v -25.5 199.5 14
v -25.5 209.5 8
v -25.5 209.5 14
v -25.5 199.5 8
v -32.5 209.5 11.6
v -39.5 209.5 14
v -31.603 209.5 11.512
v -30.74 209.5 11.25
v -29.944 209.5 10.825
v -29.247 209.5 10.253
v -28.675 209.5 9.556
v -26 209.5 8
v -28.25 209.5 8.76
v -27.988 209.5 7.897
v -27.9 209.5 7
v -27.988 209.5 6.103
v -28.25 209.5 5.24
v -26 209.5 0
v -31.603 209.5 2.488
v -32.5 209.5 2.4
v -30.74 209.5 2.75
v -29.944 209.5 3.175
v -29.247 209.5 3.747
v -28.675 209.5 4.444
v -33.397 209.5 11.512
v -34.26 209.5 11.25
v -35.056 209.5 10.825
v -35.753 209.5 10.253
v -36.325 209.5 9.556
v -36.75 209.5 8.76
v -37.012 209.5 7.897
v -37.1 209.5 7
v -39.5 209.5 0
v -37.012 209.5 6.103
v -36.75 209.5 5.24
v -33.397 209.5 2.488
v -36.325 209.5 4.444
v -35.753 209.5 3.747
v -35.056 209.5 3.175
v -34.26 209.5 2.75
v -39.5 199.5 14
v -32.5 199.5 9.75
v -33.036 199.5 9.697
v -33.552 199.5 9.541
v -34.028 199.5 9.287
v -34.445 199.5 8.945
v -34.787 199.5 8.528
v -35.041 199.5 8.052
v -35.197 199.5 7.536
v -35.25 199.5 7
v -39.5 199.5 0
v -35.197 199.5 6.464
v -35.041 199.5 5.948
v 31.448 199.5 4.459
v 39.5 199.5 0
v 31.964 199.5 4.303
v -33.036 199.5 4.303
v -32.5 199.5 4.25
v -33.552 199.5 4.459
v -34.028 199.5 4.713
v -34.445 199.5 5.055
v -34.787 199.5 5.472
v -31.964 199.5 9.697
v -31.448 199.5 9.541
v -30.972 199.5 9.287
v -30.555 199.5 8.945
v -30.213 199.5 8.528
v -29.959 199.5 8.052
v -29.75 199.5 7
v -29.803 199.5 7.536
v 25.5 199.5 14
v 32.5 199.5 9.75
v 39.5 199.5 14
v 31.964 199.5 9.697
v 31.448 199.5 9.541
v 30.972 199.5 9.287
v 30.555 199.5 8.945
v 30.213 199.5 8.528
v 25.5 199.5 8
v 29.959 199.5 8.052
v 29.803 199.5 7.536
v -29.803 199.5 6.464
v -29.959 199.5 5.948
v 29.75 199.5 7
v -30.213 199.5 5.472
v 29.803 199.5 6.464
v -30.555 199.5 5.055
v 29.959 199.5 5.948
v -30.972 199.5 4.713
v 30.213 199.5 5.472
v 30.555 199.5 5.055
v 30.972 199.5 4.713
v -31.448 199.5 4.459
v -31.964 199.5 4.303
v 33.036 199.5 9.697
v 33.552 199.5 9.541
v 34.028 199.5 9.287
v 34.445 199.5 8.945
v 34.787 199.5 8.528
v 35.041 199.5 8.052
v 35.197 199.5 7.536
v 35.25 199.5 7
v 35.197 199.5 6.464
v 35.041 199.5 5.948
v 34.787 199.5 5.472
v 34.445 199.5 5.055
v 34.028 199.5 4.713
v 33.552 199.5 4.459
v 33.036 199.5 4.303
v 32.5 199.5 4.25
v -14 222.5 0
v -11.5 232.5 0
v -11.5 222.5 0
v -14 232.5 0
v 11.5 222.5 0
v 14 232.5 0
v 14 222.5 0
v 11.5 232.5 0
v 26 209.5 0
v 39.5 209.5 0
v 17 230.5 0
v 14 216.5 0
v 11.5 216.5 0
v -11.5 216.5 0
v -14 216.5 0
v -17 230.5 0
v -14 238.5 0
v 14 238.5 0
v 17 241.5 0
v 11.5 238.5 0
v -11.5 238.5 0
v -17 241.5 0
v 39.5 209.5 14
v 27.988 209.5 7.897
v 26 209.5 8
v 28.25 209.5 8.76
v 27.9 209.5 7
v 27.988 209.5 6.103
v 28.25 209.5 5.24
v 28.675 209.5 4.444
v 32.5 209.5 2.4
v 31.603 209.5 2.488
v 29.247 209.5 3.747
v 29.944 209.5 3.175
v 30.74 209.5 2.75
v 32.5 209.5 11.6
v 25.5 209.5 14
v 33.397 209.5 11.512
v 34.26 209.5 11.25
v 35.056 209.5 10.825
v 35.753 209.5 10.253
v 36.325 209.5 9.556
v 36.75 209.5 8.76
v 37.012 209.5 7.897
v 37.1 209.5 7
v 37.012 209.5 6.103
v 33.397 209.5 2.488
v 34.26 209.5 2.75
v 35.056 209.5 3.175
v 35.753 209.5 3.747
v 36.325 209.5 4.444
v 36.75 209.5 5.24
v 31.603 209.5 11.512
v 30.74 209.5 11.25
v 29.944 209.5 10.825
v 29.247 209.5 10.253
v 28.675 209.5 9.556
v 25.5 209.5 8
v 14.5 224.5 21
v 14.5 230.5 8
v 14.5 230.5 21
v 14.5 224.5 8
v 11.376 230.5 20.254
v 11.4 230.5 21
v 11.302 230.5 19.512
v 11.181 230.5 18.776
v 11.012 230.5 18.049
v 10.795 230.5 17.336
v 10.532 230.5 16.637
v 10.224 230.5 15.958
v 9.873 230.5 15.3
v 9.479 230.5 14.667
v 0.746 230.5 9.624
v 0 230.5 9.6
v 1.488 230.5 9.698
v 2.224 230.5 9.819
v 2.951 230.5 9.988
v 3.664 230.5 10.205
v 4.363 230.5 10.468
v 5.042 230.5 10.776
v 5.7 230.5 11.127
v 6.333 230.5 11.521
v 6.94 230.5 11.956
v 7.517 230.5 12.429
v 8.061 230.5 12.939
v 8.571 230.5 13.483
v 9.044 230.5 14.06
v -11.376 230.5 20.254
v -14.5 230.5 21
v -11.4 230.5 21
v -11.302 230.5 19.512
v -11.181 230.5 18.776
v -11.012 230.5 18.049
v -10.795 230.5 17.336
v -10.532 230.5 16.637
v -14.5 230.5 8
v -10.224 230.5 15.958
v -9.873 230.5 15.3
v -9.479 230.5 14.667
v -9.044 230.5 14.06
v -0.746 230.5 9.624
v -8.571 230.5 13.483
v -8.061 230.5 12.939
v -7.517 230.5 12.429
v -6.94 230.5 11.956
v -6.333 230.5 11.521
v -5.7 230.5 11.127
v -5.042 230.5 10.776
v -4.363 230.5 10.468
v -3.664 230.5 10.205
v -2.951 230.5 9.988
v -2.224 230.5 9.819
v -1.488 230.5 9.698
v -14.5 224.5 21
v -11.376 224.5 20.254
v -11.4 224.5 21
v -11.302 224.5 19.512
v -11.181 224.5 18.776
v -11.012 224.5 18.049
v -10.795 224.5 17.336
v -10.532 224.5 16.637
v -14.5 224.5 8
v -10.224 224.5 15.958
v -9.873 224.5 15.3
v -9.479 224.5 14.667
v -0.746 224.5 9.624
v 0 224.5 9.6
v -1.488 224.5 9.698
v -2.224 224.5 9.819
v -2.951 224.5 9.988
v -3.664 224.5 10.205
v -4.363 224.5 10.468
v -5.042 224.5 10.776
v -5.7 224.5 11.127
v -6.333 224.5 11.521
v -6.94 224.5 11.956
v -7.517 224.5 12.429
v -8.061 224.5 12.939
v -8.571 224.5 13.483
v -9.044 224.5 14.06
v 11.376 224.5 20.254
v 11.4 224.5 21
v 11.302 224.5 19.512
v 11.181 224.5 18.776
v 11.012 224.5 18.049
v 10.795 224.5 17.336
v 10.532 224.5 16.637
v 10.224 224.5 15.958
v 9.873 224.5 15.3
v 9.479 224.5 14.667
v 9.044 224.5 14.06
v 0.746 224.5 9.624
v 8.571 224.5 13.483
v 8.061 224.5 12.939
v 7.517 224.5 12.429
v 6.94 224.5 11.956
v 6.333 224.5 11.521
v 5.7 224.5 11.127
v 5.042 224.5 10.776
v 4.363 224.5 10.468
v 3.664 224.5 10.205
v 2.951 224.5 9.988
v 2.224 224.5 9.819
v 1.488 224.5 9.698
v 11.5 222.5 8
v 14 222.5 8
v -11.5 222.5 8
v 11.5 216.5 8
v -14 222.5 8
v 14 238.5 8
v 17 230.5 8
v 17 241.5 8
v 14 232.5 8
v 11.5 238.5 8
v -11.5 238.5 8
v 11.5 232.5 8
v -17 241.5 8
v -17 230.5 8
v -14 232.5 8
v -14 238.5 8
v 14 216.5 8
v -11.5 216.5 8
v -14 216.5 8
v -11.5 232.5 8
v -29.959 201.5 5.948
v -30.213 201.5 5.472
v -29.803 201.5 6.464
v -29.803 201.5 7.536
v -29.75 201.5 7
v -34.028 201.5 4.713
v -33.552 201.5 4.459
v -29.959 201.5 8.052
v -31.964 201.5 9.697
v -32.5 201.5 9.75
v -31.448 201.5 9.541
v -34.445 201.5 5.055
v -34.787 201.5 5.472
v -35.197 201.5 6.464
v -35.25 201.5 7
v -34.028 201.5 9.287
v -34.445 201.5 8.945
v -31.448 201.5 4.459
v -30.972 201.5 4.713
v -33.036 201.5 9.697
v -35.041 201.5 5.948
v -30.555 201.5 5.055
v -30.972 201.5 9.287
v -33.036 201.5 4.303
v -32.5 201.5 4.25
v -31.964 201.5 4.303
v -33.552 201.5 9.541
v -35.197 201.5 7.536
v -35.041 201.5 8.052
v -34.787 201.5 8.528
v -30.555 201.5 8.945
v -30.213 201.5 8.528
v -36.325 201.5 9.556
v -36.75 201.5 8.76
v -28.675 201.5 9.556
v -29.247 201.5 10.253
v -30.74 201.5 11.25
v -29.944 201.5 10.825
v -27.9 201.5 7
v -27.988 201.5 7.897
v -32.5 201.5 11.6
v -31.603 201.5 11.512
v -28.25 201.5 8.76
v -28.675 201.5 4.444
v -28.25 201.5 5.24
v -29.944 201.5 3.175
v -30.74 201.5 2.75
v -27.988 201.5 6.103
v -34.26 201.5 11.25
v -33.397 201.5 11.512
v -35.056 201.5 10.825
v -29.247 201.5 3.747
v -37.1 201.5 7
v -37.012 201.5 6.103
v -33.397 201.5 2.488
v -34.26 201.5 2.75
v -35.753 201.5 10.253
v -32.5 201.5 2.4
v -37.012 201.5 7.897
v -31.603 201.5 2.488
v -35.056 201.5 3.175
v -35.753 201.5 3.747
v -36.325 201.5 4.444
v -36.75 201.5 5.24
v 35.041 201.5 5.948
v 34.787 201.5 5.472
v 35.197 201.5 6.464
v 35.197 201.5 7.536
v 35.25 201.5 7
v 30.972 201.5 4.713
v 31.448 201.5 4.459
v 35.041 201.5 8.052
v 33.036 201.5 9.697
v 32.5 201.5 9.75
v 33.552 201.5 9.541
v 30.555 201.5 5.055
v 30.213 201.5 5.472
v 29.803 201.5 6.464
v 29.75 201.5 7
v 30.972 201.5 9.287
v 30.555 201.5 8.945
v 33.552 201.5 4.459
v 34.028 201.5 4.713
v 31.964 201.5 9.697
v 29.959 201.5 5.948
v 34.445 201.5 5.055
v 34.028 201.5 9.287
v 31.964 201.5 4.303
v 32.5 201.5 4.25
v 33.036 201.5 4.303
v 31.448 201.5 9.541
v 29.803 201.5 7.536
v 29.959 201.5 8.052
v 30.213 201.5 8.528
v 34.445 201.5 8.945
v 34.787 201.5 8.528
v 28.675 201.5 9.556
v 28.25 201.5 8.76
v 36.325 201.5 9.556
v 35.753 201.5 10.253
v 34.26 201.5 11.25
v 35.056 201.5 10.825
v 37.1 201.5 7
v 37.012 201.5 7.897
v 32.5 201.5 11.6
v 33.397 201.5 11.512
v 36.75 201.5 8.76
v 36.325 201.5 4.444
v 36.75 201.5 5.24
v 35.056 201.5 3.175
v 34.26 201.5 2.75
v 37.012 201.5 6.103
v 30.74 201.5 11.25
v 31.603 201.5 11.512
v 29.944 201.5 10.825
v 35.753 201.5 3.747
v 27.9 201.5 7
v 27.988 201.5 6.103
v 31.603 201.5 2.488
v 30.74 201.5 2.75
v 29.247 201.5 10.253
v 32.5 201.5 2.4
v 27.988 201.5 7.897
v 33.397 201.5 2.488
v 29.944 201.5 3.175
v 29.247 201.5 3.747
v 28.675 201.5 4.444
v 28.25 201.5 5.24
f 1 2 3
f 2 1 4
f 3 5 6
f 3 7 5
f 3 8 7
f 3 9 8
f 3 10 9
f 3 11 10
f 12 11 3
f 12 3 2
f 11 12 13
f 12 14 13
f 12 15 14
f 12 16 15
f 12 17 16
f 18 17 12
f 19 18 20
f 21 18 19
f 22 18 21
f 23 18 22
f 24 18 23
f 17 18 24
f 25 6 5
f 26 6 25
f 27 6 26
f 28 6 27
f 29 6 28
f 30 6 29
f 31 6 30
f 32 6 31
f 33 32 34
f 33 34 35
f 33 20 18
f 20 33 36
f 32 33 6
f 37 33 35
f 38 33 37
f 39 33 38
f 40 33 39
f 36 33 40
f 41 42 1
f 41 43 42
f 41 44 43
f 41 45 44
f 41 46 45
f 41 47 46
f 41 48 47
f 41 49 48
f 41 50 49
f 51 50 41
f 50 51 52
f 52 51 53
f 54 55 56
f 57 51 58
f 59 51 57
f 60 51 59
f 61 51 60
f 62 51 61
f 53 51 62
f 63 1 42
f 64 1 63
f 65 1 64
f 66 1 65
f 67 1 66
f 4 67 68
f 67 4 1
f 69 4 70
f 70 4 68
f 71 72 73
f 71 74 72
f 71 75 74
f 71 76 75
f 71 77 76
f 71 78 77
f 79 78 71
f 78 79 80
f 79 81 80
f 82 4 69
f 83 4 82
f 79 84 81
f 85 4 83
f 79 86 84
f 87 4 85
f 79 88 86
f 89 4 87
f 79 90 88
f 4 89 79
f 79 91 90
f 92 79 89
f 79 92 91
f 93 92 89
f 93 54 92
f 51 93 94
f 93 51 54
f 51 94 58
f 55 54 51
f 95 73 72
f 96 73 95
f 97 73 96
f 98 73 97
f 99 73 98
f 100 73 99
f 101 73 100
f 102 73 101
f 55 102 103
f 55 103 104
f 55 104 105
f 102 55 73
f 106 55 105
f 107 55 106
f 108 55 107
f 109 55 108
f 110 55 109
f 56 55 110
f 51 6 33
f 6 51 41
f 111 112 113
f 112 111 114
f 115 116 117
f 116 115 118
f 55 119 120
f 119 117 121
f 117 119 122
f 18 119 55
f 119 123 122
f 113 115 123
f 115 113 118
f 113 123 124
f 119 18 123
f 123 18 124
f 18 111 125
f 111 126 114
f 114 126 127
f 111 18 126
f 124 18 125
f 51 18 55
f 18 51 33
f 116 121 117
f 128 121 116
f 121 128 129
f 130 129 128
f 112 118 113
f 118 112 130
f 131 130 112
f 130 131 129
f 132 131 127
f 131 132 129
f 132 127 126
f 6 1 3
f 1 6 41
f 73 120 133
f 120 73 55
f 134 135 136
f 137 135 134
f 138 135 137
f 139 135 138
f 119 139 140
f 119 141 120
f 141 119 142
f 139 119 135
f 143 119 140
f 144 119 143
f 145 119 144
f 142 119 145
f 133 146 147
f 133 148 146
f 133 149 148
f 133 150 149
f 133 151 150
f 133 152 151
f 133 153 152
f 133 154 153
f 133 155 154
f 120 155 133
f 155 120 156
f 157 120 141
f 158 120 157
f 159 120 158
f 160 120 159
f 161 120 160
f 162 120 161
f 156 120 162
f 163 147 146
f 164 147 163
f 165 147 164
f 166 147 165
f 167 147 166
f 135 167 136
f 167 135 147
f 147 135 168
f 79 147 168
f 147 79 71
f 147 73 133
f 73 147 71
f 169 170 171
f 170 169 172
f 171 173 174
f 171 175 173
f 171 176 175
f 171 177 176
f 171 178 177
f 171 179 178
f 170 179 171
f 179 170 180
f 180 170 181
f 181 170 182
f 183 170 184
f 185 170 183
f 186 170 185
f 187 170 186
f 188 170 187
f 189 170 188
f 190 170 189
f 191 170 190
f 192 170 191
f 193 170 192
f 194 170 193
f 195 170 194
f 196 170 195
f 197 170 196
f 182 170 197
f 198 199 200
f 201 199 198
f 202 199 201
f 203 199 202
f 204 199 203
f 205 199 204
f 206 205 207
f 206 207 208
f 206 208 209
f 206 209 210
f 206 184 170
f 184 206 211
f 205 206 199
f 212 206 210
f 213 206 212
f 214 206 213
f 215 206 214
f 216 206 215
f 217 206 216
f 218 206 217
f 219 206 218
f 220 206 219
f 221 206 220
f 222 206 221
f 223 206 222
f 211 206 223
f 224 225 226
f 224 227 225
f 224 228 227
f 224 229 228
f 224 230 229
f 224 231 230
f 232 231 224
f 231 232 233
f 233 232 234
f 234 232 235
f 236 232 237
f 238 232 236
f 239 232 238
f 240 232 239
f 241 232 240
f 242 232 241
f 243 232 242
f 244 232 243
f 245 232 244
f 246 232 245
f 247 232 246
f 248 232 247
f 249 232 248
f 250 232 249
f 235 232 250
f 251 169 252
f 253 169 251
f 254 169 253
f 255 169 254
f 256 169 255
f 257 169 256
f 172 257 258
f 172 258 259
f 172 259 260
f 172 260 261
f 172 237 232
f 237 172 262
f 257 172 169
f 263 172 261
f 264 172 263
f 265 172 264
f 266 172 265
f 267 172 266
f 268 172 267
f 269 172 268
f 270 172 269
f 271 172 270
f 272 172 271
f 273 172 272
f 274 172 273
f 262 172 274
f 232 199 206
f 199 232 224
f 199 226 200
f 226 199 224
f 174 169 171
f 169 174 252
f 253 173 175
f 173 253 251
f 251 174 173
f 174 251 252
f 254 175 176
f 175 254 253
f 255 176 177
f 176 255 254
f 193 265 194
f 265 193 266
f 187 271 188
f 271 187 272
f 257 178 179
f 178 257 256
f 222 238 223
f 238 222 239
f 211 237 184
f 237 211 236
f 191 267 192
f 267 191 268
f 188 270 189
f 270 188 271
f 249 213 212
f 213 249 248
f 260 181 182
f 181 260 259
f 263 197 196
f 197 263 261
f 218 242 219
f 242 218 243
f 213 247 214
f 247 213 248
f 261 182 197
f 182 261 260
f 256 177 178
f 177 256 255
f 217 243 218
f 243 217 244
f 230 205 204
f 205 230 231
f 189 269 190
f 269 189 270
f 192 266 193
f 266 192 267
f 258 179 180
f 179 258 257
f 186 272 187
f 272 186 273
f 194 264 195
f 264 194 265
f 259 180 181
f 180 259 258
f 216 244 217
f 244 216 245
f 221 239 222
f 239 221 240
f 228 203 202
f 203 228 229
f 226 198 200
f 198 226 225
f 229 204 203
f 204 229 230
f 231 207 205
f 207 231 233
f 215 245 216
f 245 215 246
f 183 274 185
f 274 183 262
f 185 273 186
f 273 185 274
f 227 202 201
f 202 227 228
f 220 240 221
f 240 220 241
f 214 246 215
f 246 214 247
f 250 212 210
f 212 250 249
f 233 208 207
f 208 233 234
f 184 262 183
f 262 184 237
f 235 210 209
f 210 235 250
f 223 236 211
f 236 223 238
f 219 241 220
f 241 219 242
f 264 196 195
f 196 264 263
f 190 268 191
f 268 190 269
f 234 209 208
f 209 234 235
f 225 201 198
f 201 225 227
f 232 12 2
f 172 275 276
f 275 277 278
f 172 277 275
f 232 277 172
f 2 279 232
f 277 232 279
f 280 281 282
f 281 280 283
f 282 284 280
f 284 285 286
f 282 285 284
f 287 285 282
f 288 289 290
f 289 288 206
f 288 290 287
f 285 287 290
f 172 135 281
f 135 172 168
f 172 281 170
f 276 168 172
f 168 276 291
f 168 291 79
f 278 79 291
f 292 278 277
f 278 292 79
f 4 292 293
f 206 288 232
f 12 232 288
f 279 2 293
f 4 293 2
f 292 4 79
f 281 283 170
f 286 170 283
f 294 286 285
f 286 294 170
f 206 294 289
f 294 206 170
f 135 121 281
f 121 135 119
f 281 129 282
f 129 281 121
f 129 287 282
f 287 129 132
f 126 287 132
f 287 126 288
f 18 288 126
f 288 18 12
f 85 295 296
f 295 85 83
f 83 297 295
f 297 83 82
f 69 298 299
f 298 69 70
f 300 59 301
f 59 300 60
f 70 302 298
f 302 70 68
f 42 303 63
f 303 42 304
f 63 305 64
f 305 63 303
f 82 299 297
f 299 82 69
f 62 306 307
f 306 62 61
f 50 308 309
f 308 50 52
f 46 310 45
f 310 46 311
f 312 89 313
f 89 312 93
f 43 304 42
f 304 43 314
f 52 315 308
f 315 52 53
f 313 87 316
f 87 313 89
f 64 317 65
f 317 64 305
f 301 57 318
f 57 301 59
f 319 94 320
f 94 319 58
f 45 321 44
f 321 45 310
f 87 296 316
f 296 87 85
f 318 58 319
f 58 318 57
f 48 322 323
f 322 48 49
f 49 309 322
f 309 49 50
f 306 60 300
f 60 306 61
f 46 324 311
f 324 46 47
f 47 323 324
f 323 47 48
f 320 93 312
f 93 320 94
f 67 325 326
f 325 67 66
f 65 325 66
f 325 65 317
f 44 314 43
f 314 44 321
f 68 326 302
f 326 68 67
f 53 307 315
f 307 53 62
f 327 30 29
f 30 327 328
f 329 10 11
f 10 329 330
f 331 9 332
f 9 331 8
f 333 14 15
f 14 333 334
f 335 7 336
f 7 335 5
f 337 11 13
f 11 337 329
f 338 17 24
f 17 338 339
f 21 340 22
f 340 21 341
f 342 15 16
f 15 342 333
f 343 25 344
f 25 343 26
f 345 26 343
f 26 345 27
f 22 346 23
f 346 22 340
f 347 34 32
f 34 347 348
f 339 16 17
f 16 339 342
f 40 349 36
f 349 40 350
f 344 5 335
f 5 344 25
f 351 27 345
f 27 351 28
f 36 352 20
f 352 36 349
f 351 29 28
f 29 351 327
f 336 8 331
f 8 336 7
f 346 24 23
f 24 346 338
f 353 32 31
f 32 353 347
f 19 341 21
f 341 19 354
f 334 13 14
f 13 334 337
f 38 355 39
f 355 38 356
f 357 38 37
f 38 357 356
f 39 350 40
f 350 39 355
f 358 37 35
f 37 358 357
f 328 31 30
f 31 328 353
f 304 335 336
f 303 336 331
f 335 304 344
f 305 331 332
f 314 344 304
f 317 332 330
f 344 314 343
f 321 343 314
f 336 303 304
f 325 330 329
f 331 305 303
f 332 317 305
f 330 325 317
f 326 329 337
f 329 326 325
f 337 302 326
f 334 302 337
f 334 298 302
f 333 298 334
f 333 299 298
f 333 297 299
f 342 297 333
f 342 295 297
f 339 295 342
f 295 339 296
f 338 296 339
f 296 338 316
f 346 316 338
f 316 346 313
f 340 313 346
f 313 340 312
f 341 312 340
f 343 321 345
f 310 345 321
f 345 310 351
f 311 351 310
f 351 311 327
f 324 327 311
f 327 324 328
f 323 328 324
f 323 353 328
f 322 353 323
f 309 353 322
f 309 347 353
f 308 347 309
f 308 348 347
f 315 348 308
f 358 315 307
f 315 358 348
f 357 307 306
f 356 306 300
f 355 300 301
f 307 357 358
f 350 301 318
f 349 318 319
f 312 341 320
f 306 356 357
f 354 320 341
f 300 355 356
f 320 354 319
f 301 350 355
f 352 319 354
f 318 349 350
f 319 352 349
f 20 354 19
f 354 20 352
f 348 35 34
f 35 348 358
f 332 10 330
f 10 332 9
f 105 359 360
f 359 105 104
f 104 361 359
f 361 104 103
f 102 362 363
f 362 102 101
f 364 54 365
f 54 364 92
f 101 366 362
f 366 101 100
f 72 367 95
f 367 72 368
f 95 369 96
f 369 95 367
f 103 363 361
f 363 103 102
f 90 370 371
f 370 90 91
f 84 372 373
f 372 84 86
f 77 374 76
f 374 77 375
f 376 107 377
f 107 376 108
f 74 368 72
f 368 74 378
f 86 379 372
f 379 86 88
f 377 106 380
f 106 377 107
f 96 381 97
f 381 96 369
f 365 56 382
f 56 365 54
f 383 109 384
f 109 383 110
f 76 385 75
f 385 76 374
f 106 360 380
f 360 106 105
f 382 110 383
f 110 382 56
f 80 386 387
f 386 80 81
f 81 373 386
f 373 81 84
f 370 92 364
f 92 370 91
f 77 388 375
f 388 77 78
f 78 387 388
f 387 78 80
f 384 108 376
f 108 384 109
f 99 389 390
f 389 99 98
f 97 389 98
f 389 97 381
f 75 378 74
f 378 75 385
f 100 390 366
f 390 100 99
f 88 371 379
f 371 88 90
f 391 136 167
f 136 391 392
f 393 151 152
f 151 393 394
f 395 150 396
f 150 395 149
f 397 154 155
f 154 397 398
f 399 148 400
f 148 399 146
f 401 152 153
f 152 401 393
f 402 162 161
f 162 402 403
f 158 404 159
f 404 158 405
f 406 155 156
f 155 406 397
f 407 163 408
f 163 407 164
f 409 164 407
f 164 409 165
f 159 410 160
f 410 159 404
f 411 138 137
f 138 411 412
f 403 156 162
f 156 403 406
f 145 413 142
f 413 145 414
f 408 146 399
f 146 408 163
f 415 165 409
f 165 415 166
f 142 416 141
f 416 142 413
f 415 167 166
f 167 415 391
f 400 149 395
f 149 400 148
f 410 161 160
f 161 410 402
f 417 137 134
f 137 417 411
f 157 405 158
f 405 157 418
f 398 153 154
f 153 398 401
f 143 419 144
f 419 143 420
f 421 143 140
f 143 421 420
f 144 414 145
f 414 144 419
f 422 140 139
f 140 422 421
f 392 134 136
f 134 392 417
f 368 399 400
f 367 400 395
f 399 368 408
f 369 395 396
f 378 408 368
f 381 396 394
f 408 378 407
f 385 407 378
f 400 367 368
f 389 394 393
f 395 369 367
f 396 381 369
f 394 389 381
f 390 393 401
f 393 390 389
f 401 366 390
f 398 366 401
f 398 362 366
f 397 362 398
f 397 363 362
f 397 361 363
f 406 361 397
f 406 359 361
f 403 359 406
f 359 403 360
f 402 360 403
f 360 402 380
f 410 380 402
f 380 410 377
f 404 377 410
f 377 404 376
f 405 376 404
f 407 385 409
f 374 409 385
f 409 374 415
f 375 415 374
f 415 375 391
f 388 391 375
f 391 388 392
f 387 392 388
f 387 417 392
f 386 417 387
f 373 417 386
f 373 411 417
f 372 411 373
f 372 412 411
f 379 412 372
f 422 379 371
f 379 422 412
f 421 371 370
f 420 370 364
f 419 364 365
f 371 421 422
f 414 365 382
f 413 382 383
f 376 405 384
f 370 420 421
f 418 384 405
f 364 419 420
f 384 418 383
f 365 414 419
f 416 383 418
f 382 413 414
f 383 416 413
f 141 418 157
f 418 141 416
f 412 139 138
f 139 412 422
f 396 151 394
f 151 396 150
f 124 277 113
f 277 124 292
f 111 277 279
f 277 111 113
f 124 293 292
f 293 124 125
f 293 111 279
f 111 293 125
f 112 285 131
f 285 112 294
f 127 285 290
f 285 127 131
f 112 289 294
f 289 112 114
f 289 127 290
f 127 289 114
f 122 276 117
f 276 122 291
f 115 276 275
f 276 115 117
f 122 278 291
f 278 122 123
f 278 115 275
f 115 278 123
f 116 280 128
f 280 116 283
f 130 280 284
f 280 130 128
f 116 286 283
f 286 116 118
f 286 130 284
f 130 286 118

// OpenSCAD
include <../lib/meshtastic-drybag-node-lib.scad>;
$fn = 40;
stem_print();
